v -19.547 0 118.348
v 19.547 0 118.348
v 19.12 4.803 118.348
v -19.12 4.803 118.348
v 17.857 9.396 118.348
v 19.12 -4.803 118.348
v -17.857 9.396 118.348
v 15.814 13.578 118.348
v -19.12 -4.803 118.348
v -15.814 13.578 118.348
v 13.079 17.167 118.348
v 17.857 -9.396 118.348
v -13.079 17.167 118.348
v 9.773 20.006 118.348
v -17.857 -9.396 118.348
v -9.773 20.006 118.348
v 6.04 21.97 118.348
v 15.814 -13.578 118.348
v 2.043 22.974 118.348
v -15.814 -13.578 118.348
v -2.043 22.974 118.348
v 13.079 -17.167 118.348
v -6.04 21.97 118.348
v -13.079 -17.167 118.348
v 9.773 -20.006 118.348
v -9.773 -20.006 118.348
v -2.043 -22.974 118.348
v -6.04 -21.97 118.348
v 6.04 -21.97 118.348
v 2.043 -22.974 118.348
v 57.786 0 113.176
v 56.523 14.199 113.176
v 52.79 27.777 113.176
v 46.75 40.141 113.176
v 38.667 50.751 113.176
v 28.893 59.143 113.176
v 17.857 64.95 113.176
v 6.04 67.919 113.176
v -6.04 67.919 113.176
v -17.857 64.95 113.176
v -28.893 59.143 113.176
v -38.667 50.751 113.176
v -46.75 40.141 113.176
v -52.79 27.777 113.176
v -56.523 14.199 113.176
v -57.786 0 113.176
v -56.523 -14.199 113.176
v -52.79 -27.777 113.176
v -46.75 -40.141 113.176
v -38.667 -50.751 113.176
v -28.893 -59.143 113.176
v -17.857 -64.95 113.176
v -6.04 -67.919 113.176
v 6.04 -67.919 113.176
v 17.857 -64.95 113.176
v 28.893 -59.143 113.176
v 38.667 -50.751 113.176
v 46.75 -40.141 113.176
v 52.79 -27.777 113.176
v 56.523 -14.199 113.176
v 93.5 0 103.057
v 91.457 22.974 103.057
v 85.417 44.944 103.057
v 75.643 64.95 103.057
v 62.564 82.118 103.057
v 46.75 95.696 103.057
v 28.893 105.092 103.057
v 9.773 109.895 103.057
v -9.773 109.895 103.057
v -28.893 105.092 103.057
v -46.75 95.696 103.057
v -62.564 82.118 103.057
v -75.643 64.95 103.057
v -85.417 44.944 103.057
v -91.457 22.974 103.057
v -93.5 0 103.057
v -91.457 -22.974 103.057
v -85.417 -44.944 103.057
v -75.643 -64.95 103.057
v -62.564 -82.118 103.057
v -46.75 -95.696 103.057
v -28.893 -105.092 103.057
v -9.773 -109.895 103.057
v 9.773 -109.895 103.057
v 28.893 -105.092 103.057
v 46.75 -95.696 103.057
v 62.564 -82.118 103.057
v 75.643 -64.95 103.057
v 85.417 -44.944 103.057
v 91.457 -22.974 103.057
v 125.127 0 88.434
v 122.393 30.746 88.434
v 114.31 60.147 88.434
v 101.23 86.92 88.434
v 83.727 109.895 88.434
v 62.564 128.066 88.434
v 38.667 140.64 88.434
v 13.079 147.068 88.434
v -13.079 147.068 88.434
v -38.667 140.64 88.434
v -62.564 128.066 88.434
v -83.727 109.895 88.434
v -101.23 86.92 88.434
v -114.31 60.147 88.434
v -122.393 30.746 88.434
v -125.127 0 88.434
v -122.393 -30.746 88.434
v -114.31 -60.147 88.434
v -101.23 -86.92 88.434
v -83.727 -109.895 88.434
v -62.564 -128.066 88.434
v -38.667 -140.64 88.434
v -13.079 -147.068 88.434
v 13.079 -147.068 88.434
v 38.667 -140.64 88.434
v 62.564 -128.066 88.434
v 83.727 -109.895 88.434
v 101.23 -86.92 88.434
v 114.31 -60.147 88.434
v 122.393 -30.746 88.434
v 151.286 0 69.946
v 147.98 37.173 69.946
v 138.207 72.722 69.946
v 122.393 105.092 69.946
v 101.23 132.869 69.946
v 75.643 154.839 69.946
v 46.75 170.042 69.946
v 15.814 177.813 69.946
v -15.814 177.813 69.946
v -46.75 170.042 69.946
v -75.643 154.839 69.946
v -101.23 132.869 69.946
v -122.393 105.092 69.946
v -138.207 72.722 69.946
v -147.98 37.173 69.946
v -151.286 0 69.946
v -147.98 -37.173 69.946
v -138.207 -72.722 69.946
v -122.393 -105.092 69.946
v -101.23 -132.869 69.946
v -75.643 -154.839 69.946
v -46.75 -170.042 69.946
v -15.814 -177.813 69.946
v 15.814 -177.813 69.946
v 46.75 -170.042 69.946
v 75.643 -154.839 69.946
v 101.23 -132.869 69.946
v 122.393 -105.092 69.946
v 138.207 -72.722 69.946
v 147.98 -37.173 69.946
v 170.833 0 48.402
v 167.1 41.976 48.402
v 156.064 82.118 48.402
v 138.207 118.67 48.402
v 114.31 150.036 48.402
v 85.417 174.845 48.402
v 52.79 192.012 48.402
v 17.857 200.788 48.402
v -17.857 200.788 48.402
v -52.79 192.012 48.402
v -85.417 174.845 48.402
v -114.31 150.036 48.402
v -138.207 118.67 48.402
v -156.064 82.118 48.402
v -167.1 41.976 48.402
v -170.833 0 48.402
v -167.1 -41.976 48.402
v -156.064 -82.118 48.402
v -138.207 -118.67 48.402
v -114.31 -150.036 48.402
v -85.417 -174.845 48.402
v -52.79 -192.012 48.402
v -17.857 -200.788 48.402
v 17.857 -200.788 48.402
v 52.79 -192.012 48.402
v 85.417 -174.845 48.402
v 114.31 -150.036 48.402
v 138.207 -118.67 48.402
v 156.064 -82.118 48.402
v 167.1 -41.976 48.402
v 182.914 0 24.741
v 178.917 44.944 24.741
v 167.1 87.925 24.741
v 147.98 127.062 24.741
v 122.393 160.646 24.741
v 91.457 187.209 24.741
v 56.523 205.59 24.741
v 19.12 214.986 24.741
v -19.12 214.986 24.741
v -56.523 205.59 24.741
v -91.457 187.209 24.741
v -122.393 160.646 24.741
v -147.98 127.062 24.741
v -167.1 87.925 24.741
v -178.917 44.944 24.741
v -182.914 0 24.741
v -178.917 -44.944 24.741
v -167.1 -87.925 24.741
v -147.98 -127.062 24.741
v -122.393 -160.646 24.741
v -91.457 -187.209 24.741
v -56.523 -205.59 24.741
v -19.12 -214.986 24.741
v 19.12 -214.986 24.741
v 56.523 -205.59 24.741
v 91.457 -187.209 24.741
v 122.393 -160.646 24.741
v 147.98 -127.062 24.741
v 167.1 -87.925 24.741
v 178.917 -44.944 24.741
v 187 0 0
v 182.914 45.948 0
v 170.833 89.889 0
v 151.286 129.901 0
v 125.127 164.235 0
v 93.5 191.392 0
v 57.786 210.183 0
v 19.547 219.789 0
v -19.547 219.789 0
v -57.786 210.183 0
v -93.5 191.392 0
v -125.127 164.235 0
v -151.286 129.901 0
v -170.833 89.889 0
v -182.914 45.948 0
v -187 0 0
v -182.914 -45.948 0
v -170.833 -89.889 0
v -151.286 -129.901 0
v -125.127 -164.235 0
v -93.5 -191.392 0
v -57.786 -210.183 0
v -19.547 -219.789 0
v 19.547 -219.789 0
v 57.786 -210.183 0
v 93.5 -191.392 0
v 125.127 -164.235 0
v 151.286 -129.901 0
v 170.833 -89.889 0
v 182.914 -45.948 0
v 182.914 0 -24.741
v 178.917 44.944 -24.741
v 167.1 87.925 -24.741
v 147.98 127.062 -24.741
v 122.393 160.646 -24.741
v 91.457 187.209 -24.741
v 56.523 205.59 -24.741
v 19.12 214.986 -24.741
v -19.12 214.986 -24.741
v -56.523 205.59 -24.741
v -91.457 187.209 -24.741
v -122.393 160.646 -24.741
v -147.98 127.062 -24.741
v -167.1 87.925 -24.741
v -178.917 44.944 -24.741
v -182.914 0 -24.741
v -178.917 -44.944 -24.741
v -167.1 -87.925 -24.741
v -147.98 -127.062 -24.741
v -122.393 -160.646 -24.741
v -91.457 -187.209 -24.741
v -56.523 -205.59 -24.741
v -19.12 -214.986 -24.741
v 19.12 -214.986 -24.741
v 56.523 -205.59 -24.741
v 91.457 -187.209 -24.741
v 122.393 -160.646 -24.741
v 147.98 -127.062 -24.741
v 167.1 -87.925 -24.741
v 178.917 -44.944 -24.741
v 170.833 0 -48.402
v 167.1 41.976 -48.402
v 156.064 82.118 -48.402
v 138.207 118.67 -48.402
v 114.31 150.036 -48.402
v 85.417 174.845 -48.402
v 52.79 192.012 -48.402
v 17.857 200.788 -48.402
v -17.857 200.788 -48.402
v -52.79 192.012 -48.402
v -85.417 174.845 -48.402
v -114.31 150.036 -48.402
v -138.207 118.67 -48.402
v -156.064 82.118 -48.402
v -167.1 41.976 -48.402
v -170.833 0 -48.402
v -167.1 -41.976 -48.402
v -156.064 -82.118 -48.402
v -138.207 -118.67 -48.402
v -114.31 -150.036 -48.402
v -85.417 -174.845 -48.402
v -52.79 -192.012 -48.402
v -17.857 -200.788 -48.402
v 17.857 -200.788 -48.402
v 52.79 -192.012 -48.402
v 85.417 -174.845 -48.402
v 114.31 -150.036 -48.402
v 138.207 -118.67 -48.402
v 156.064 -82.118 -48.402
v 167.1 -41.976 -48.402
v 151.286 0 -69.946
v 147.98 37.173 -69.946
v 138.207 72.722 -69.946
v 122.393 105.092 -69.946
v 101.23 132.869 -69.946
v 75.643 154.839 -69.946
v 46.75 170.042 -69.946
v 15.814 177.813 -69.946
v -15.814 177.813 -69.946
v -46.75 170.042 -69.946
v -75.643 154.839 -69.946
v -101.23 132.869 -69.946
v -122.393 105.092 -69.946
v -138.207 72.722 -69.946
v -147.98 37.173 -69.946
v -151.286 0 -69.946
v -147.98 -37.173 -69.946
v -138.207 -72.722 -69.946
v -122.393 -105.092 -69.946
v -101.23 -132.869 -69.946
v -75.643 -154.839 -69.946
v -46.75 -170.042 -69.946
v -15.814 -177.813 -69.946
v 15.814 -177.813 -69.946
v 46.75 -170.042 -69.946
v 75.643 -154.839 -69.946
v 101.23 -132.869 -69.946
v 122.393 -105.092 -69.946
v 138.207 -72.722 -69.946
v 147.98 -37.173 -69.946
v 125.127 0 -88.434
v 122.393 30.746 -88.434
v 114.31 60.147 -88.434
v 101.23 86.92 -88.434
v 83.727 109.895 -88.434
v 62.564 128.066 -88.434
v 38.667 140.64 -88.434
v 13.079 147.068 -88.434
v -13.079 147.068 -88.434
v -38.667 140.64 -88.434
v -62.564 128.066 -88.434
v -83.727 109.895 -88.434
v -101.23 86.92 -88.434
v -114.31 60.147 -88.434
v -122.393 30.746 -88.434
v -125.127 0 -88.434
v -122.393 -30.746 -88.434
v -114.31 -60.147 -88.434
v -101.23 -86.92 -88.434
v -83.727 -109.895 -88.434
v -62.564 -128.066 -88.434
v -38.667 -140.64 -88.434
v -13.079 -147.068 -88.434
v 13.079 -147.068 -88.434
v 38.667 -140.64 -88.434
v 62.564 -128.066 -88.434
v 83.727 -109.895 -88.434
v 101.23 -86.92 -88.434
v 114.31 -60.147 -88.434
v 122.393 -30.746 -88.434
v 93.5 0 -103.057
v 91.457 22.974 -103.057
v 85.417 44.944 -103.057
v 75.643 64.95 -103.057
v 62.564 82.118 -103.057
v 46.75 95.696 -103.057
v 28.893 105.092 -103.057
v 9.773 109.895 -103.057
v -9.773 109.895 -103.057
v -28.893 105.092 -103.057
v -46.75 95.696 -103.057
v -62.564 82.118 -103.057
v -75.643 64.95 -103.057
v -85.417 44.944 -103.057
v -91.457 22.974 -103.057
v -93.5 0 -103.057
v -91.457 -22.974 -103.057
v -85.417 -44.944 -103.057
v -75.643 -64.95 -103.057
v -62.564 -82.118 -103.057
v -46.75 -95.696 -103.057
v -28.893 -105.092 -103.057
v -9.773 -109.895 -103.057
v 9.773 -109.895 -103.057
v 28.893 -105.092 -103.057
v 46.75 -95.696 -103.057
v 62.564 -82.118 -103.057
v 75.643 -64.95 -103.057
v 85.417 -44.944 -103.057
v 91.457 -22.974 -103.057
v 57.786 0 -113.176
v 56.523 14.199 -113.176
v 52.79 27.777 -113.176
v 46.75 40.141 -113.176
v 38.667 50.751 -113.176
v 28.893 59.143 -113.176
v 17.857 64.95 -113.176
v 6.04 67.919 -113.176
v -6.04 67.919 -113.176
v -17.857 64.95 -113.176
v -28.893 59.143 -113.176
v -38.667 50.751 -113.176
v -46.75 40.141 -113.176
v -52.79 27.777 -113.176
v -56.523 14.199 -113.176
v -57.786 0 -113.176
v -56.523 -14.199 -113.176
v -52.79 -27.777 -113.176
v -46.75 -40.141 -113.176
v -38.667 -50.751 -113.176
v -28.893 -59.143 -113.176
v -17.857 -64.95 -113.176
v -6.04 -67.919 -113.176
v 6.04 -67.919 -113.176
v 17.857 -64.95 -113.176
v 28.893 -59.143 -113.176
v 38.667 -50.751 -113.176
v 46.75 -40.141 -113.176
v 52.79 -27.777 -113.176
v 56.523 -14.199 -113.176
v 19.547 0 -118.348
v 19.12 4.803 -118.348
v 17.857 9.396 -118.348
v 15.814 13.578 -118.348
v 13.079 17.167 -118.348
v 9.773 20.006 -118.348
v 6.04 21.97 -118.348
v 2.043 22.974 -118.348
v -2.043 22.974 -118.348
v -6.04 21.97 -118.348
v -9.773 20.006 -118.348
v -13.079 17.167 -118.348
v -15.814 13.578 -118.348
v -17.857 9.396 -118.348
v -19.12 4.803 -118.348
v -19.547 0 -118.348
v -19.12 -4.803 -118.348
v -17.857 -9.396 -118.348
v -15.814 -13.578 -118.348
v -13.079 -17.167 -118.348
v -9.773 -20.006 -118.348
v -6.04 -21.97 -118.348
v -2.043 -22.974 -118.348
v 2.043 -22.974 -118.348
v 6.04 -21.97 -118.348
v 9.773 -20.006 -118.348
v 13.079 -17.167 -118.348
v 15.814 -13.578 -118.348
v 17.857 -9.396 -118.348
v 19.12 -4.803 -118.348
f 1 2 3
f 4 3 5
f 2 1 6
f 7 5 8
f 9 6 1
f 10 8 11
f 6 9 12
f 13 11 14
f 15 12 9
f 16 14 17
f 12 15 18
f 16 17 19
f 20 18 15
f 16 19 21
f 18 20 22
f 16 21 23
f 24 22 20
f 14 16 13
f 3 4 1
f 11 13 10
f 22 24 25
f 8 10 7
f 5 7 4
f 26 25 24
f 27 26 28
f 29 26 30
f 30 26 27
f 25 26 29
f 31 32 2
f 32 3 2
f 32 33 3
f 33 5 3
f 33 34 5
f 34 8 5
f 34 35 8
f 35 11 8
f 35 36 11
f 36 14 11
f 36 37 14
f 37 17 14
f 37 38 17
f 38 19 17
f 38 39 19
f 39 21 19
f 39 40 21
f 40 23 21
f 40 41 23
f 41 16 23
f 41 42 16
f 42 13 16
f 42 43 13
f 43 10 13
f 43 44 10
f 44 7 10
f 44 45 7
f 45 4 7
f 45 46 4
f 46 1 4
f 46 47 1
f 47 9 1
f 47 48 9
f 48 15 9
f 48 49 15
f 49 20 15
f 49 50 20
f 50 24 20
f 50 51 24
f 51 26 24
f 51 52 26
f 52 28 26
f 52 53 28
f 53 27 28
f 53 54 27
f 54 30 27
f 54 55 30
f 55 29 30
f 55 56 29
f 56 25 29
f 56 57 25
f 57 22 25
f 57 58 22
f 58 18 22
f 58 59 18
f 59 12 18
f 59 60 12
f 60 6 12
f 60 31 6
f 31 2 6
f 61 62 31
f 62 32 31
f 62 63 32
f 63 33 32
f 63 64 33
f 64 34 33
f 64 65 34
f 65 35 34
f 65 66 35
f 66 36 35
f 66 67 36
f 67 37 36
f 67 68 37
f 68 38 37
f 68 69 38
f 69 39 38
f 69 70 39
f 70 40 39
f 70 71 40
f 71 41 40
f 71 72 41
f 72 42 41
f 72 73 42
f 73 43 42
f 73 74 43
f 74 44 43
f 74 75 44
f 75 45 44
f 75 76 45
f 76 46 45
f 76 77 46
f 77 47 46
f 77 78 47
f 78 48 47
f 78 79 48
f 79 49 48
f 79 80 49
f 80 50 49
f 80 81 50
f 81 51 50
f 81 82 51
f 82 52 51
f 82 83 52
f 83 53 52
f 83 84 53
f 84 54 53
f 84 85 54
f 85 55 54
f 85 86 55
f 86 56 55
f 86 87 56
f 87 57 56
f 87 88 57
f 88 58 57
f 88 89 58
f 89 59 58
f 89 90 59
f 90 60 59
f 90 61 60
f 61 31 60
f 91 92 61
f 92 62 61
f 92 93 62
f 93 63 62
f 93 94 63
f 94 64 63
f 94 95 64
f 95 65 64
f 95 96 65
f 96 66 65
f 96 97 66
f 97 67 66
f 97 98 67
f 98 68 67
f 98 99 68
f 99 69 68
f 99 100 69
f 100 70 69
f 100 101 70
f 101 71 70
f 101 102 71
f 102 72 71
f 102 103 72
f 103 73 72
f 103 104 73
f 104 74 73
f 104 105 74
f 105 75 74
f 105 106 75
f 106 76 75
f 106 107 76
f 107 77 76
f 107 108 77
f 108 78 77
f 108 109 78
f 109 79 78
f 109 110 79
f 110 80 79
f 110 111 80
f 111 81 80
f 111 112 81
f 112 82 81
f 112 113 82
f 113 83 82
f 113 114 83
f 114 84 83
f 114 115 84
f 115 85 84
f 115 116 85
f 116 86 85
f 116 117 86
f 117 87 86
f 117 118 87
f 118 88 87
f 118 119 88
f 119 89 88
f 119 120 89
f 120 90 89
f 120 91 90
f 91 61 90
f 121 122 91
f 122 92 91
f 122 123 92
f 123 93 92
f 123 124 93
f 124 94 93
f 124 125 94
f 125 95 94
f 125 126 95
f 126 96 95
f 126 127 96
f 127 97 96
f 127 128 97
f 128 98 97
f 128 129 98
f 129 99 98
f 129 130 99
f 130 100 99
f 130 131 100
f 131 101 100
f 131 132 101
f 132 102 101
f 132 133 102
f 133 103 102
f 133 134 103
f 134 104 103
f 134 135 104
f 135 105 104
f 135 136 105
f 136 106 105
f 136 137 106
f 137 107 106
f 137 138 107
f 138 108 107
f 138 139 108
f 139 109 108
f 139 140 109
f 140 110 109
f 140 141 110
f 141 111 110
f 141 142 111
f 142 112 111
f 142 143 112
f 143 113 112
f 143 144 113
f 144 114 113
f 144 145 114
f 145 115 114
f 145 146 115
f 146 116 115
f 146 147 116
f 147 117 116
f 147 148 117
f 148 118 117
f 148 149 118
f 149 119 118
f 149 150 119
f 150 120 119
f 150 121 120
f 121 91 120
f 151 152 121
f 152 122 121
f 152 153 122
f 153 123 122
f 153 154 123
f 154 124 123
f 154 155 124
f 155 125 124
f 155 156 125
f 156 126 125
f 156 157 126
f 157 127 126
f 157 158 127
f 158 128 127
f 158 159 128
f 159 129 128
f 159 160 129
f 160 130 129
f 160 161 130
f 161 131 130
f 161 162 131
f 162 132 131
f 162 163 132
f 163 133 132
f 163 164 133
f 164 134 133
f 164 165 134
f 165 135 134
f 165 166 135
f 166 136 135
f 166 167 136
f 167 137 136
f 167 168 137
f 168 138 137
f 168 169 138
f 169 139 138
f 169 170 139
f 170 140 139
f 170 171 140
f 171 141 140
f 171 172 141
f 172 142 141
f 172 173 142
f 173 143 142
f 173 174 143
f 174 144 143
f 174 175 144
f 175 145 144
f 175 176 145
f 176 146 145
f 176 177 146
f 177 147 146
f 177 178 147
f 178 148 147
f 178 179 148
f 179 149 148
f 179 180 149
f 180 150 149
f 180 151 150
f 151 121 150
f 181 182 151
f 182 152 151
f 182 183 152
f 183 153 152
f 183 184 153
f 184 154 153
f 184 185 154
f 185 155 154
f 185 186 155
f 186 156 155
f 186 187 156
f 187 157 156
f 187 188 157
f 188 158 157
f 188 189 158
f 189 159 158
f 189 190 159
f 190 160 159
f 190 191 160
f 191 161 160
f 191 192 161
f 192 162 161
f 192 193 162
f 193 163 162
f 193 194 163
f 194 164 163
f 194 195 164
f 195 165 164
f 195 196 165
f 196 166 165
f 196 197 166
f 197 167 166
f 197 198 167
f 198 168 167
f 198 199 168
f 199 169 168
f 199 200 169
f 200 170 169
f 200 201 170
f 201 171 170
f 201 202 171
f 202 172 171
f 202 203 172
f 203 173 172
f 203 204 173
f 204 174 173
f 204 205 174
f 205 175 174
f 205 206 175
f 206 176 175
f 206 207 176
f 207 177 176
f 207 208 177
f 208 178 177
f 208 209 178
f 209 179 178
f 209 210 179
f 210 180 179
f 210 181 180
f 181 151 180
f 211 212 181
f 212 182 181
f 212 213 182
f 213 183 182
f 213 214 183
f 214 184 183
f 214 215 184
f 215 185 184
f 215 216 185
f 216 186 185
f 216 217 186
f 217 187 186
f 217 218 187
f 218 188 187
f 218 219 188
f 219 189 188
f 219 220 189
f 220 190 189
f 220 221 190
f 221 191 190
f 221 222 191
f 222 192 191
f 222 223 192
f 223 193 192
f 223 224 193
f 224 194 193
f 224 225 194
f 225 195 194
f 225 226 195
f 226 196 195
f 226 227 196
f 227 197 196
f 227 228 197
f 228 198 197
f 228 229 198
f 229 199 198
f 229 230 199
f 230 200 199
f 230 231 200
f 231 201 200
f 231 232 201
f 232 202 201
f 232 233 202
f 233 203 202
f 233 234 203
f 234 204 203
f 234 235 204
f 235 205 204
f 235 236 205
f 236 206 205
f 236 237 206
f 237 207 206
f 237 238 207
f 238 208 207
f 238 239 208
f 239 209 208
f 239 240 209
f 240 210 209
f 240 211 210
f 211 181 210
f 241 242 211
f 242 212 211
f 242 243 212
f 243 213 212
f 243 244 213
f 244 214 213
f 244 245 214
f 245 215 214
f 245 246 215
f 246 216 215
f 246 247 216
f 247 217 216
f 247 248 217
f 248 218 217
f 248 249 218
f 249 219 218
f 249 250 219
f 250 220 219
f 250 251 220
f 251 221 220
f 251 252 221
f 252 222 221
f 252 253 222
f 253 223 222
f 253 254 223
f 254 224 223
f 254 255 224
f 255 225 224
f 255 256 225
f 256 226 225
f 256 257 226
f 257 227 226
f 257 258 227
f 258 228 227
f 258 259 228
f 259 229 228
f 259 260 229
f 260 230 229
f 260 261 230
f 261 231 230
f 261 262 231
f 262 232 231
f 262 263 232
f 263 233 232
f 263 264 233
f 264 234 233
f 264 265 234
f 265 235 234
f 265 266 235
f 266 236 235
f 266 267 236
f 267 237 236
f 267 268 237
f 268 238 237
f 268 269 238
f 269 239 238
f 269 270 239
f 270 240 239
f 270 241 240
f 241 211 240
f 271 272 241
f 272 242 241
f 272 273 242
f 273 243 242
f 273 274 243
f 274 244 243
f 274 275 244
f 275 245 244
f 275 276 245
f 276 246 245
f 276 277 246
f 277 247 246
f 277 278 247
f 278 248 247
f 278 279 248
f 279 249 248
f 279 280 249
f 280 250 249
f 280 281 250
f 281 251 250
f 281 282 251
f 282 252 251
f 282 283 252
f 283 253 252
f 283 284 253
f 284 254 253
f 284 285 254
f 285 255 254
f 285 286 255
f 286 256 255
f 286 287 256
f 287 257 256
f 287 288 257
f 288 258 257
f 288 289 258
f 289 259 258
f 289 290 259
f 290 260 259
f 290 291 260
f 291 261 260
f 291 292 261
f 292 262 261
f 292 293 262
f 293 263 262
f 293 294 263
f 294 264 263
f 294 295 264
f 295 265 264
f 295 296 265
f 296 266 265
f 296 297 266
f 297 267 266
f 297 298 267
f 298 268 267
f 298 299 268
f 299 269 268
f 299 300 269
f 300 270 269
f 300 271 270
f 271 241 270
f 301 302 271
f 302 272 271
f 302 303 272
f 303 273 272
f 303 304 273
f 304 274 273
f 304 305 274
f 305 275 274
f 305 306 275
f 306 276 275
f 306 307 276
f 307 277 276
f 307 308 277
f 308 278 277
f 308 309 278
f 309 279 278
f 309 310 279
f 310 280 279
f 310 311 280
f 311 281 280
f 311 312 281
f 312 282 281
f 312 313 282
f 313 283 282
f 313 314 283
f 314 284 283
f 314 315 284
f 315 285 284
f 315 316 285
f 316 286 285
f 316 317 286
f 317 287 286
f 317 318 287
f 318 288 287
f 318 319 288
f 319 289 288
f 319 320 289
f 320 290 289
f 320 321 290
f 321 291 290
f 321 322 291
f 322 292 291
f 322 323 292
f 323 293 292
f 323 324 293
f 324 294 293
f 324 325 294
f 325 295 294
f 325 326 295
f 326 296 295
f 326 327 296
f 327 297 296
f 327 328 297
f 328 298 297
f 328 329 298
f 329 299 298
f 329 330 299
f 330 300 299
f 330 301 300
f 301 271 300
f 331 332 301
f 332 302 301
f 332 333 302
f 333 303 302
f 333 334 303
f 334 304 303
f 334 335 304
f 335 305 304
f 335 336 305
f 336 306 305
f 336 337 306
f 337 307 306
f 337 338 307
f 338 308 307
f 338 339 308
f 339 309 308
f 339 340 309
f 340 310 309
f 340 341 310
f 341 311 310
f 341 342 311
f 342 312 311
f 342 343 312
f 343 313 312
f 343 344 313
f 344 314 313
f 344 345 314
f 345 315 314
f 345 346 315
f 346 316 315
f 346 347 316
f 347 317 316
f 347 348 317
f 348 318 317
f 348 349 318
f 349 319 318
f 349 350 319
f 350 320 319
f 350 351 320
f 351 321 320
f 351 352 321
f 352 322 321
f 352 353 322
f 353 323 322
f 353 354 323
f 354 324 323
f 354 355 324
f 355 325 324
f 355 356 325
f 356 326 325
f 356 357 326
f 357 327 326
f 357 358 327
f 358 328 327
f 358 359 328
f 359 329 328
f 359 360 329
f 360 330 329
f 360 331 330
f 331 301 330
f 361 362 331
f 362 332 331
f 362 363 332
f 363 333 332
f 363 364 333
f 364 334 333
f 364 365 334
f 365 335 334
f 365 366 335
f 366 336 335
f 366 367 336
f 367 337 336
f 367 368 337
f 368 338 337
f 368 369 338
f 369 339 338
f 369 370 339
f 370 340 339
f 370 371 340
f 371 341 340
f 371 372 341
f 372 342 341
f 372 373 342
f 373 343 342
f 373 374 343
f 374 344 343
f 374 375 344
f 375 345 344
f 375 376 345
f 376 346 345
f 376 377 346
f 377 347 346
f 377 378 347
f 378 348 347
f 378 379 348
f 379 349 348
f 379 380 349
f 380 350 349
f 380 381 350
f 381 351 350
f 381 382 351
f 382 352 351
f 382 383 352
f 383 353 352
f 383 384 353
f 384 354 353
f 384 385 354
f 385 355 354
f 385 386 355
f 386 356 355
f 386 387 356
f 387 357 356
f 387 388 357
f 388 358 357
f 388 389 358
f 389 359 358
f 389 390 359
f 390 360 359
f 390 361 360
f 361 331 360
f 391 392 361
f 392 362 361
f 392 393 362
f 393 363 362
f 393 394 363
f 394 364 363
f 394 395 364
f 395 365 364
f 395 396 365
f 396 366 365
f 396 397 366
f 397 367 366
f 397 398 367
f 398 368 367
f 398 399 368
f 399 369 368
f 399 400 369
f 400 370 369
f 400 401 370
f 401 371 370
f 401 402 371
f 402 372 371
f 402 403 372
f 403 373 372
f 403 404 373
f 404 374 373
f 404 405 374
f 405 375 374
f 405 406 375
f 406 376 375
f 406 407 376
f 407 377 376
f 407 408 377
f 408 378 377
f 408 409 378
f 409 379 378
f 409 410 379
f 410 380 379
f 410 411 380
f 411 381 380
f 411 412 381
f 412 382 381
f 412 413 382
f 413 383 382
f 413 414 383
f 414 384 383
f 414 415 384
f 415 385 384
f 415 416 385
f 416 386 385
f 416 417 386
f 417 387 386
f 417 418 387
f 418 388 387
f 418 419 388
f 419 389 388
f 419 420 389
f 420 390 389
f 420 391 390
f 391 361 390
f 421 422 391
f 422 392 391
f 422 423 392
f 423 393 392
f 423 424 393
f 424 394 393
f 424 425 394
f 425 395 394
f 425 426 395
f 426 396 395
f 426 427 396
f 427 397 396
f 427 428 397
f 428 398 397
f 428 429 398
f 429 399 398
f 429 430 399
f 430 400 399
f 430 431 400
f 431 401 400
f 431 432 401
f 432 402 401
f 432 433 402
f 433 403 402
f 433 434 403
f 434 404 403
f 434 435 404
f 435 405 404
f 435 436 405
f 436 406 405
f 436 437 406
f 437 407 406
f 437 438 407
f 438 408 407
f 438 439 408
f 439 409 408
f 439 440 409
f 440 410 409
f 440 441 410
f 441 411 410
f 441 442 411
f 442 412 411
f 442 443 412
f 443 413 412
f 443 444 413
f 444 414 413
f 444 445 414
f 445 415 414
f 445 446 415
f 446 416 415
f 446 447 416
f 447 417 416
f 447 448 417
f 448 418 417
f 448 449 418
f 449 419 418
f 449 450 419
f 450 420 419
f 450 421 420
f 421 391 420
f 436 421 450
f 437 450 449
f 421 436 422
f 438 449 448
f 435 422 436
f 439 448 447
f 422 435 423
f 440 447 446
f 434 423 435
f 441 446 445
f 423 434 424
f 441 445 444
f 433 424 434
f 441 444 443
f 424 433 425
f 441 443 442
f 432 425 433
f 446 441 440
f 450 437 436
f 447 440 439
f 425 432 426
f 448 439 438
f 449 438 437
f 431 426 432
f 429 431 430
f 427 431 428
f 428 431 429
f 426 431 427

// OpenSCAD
// Generated by SolidPython 1.0.1 on 2020-07-29 00:46:49


scale(v = [11, 13, 7]) {
	sphere(r = 17);
}
/***********************************************
*********      SolidPython code:      **********
************************************************
 
# import packages: SolidPython
from solid import *
from solid.utils import *
from itertools import chain, combinations, permutations


class Resize:

    def __init__(self, scad_file):
        self.scad_file = scad_file
        #self.scad_file = import_scad(scad_file)
        # cone/cylinder param:
        self.r1 = 0
        self.r2 = 0
        self.h = 0
        # rectangular prism param:
        self.w = 0
        self.l = 0
        # ellipse param:
        self.r = 0

    # import OpenScad code (file name corresponds to shape)


    # classify shape + parameters
    def assign(self, param1, param2, param3):
        if self.scad_file == 'cone.scad':
            self.r1 = param1
            self.r2 = param2
            self.h = param3
        elif self.scad_file == 'cylinder.scad':
            self.r1 = param1
            self.r2 = param2
            self.h = param3
        elif self.scad_file == 'rectangularPrism.scad':
            self.h = param1
            self.l = param2
            self.w = param3
        else:
            self.r = param1
            self.h = param2

    # resize parameters
    def iterate(self):
        x = range(3, 20, 2)
        i = 1
        if self.scad_file == 'cone.scad':
            tempList = list(permutations(x, 2))
            for temp in tempList:
                param1 = temp[0]
                param2 = temp[1]
                filepath = 'produced_scad_files/' + 'cone' + str(param1) + '_' + str(param2) + '_' + '.scad'
                scad_render_to_file(cylinder(h=param1, r1=param2, r2=0), filepath)

        elif self.scad_file == 'cylinder.scad':
            tempList = list(permutations(x, 3))
            for temp in tempList:
                param1 = temp[0]
                param2 = temp[1]
                filepath = 'produced_scad_files/' + 'cylinder' + str(param1) + '_' + str(param2) + '_' + '.scad'
                scad_render_to_file(cylinder(h=param1, r1=param2, r2=param2), filepath)

        elif self.scad_file == 'rectangularPrism.scad':
            tempList = list(permutations(x, 3))
            for temp in tempList:
                param1 = temp[0]
                param2 = temp[1]
                param3 = temp[2]
                filepath = 'produced_scad_files/' + 'rectangularPrism' + str(param1) + '_' + str(param2) + '_' + str(
                    param3) + '.scad'
                scad_render_to_file(cube(size=(param1, param2, param3)), filepath)

        elif self.scad_file == 'ellipse.scad':
            tempList = list(permutations(x, 4))
            for temp in tempList:
                param1 = temp[0]
                param2 = temp[1]
                param3 = temp[2]
                param4 = temp[3]
                filepath = 'produced_scad_files/' + 'ellipse' + str(param1) + '_' + str(param2) + '_' + str(param3) + '_' + str(param4) + '.scad'
                scad_render_to_file(scale([param1, param2, param3])(sphere(r=param4)), filepath)

    def render_to_scadfile(self):
        scad_render_to_file(scad, 'example.scad') 
 
************************************************/
